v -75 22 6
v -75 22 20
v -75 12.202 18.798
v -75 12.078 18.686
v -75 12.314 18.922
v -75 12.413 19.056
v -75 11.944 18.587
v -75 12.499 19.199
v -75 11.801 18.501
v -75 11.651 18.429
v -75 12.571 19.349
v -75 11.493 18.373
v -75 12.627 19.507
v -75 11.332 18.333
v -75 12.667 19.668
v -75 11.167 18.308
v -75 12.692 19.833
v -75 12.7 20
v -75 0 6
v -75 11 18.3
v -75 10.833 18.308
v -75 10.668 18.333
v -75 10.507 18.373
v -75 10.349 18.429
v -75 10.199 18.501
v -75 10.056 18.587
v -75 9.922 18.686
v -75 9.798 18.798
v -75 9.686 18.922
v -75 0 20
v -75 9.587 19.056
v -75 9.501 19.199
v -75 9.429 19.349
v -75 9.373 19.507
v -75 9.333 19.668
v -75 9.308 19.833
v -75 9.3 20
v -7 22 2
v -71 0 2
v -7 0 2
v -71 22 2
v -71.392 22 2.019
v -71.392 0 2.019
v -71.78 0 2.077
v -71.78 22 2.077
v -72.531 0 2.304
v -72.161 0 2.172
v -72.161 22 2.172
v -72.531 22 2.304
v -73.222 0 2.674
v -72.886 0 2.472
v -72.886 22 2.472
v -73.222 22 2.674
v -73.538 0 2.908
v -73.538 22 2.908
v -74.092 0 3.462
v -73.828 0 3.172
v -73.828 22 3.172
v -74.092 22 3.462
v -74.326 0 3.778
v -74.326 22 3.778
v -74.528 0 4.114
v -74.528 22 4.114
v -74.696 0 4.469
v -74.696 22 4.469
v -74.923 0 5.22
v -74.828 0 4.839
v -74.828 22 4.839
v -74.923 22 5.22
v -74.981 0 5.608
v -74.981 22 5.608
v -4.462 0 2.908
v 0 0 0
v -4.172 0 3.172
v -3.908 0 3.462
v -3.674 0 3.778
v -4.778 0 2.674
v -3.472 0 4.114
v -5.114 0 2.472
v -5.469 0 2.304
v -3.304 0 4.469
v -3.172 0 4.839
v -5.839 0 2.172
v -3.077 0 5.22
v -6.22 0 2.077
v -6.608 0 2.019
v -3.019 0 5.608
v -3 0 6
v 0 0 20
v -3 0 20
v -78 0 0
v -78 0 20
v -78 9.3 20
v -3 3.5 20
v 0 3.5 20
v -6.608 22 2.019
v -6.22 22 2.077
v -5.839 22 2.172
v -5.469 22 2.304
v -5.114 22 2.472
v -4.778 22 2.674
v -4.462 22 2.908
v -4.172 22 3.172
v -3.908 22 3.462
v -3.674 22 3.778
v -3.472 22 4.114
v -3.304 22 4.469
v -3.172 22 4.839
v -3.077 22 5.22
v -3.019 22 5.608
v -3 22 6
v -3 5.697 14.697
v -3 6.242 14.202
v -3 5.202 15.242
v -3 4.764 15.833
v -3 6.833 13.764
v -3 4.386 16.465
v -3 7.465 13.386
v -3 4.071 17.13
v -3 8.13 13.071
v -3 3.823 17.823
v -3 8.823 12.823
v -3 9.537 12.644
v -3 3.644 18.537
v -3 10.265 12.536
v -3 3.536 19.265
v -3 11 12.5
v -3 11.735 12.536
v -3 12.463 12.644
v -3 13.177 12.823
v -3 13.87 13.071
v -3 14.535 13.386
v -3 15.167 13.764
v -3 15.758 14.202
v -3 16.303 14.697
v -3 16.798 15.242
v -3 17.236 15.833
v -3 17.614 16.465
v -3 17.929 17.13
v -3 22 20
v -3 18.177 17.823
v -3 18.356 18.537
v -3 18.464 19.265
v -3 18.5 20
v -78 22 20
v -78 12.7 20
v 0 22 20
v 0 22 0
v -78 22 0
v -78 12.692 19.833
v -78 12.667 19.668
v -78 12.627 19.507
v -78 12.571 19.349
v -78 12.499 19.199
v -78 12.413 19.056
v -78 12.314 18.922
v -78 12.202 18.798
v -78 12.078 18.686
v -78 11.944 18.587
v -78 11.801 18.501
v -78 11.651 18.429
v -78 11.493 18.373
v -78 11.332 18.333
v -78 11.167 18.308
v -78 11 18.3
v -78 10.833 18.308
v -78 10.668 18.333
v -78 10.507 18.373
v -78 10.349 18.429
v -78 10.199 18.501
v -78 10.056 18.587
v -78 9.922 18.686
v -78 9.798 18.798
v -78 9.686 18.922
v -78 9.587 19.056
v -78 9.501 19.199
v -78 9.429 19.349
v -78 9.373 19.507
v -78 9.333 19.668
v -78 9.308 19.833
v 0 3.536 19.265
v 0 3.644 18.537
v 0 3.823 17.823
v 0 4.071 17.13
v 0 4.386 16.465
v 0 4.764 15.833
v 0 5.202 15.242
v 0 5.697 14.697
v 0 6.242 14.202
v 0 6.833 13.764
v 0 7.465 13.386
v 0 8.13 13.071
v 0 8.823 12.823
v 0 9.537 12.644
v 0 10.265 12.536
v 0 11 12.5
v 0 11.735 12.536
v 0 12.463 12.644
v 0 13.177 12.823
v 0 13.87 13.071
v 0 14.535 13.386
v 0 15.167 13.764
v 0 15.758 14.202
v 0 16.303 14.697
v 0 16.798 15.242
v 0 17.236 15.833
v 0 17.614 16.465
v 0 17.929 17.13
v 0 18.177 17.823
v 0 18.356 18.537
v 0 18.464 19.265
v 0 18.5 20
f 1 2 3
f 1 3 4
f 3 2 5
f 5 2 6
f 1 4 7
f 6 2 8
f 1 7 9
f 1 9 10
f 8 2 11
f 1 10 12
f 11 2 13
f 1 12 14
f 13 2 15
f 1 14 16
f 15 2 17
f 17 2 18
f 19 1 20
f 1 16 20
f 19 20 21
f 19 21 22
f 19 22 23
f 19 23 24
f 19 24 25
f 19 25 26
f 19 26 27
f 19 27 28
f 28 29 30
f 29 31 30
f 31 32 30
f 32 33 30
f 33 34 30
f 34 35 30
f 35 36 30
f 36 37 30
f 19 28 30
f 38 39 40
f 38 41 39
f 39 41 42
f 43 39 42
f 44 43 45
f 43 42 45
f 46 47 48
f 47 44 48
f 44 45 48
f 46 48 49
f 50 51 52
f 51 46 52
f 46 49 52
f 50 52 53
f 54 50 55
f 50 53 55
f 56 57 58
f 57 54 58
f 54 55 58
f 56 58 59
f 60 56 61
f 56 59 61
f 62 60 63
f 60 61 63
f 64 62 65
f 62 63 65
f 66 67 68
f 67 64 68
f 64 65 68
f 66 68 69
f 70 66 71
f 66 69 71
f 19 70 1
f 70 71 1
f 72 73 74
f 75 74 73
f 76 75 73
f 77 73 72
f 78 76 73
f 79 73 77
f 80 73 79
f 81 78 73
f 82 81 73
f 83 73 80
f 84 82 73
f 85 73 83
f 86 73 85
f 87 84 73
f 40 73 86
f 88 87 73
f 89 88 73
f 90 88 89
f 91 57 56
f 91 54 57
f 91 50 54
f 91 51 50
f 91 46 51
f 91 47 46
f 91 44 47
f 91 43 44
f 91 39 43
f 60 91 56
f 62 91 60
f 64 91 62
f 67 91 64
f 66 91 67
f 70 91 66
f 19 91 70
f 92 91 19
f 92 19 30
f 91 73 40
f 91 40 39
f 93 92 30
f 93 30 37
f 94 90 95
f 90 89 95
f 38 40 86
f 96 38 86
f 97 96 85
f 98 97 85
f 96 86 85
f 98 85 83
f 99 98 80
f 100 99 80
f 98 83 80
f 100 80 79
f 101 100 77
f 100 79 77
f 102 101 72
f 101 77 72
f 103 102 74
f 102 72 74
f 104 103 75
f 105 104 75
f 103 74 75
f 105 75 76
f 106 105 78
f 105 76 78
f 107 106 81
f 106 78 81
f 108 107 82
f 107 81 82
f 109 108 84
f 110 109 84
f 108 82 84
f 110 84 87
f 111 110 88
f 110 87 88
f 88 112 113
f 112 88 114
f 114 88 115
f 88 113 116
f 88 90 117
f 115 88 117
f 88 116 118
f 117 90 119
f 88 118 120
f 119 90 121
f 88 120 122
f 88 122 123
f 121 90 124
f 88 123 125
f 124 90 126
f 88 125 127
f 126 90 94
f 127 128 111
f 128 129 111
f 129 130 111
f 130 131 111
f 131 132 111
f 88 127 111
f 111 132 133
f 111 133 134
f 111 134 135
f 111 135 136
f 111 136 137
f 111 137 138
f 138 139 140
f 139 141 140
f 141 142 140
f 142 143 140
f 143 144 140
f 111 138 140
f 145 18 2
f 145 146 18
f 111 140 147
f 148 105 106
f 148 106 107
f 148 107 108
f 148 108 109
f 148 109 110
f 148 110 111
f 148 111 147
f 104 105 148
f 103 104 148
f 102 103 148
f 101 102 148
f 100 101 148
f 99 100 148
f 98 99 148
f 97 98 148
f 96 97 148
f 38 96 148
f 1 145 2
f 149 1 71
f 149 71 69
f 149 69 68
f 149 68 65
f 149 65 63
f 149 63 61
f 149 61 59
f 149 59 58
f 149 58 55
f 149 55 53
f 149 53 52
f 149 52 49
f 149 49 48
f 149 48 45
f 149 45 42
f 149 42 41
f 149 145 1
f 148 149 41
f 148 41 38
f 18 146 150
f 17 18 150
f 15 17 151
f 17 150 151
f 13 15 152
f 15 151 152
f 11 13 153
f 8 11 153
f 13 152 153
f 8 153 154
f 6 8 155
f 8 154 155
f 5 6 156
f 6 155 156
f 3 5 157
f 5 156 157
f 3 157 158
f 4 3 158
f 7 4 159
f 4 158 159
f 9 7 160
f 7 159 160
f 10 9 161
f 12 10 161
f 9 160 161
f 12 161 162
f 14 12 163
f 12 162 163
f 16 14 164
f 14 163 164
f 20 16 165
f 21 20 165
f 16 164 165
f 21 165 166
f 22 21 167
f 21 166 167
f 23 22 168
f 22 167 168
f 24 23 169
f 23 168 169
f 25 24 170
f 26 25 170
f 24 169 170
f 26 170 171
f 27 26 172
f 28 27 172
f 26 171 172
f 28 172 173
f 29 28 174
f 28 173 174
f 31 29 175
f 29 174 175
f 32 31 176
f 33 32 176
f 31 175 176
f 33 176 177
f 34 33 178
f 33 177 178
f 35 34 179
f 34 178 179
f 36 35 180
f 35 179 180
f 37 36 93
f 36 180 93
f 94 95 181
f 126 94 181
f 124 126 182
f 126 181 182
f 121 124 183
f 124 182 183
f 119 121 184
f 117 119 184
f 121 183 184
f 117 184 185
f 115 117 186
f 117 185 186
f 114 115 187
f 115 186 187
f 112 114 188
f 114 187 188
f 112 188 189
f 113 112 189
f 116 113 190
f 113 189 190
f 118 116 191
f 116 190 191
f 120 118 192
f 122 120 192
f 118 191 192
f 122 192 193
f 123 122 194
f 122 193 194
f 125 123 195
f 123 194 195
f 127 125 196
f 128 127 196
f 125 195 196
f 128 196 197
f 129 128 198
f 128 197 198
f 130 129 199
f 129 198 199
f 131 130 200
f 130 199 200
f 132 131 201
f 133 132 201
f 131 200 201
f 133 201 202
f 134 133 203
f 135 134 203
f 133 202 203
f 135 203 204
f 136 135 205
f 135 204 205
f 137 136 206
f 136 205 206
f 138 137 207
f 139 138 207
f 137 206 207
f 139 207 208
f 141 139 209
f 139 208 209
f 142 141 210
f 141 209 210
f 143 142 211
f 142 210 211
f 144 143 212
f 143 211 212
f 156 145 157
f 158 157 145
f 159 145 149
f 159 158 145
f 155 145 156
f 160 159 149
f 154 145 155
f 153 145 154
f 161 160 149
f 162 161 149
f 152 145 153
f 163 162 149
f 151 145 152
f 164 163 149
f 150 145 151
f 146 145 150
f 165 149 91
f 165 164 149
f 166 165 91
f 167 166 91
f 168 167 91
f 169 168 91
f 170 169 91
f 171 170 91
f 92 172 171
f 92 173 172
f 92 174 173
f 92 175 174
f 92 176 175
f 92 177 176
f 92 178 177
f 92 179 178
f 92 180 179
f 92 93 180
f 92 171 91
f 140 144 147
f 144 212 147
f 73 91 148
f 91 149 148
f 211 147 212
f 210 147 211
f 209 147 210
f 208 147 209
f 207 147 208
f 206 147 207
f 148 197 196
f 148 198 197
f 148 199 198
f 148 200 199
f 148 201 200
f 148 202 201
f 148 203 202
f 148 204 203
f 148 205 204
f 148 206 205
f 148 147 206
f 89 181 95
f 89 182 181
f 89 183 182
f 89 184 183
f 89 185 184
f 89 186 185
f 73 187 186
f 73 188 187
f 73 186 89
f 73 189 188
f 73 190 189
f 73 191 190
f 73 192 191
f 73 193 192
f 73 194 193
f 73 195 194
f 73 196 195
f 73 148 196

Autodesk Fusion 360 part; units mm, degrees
sketch "Sketch1" plane through (0, 0, 0) normal (0, 0, 1) x (1, 0, 0)
  line L0 (0, 0) -> (-78, 0)
  line L1 (-78, 0) -> (-78, 22)
  line L2 (-78, 22) -> (0, 22)
  line L3 (0, 22) -> (0, 0)
  dimension "d1" = 78
  dimension "d2" = 22
extrude "Extrude1" add sketch "Sketch1" along normal blind 2
sketch "Sketch2" plane through (0, 0, 0) normal (1, 0, 0) x (0, 1, 0)
  line L0 (0, 0) -> (22, 0)
  line L1 (22, 0) -> (22, 2)
  line L2 (22, 2) -> (0, 2)
  line L3 (0, 2) -> (0, 0)
  line L4 (0, 2) -> (0, 20)
  line L5 (0, 20) -> (22, 20)
  line L6 (22, 20) -> (22, 2)
  circle A0 centre (11, 20) radius 7.5
  dimension "d8" = 18
  dimension "d9" = 15
extrude "Extrude2" add sketch "Sketch2" against normal blind 3 contours L2 L4 L5 L6 A0
sketch "Sketch3" plane through (-78, 0, 0) normal (-1, 0, 0) x (0, -1, 0)
  line L0 (-22, 0) -> (0, 0)
  line L1 (0, 0) -> (0, 2)
  line L2 (0, 2) -> (-22, 2)
  line L3 (-22, 2) -> (-22, 0)
  line L4 (0, 0) -> (-22, 0)
  line L5 (-22, 0) -> (-22, 2)
  line L6 (-22, 2) -> (0, 2)
  line L7 (0, 2) -> (0, 0)
  line L8 (0, 2) -> (0, 20)
  line L9 (0, 20) -> (-22, 20)
  line L10 (-22, 20) -> (-22, 2)
  circle A0 centre (-11, 20) radius 1.7
  dimension "d12" = 3.4
extrude "Extrude3" add sketch "Sketch3" against normal blind 3 contours L2 L6 L8 L9 L10 A0
fillet "Fillet1" radius 4 2 edges at (-75, 11, 2) (-3, 11, 2)
equation "d1 = 81 mm - 3 mm"
